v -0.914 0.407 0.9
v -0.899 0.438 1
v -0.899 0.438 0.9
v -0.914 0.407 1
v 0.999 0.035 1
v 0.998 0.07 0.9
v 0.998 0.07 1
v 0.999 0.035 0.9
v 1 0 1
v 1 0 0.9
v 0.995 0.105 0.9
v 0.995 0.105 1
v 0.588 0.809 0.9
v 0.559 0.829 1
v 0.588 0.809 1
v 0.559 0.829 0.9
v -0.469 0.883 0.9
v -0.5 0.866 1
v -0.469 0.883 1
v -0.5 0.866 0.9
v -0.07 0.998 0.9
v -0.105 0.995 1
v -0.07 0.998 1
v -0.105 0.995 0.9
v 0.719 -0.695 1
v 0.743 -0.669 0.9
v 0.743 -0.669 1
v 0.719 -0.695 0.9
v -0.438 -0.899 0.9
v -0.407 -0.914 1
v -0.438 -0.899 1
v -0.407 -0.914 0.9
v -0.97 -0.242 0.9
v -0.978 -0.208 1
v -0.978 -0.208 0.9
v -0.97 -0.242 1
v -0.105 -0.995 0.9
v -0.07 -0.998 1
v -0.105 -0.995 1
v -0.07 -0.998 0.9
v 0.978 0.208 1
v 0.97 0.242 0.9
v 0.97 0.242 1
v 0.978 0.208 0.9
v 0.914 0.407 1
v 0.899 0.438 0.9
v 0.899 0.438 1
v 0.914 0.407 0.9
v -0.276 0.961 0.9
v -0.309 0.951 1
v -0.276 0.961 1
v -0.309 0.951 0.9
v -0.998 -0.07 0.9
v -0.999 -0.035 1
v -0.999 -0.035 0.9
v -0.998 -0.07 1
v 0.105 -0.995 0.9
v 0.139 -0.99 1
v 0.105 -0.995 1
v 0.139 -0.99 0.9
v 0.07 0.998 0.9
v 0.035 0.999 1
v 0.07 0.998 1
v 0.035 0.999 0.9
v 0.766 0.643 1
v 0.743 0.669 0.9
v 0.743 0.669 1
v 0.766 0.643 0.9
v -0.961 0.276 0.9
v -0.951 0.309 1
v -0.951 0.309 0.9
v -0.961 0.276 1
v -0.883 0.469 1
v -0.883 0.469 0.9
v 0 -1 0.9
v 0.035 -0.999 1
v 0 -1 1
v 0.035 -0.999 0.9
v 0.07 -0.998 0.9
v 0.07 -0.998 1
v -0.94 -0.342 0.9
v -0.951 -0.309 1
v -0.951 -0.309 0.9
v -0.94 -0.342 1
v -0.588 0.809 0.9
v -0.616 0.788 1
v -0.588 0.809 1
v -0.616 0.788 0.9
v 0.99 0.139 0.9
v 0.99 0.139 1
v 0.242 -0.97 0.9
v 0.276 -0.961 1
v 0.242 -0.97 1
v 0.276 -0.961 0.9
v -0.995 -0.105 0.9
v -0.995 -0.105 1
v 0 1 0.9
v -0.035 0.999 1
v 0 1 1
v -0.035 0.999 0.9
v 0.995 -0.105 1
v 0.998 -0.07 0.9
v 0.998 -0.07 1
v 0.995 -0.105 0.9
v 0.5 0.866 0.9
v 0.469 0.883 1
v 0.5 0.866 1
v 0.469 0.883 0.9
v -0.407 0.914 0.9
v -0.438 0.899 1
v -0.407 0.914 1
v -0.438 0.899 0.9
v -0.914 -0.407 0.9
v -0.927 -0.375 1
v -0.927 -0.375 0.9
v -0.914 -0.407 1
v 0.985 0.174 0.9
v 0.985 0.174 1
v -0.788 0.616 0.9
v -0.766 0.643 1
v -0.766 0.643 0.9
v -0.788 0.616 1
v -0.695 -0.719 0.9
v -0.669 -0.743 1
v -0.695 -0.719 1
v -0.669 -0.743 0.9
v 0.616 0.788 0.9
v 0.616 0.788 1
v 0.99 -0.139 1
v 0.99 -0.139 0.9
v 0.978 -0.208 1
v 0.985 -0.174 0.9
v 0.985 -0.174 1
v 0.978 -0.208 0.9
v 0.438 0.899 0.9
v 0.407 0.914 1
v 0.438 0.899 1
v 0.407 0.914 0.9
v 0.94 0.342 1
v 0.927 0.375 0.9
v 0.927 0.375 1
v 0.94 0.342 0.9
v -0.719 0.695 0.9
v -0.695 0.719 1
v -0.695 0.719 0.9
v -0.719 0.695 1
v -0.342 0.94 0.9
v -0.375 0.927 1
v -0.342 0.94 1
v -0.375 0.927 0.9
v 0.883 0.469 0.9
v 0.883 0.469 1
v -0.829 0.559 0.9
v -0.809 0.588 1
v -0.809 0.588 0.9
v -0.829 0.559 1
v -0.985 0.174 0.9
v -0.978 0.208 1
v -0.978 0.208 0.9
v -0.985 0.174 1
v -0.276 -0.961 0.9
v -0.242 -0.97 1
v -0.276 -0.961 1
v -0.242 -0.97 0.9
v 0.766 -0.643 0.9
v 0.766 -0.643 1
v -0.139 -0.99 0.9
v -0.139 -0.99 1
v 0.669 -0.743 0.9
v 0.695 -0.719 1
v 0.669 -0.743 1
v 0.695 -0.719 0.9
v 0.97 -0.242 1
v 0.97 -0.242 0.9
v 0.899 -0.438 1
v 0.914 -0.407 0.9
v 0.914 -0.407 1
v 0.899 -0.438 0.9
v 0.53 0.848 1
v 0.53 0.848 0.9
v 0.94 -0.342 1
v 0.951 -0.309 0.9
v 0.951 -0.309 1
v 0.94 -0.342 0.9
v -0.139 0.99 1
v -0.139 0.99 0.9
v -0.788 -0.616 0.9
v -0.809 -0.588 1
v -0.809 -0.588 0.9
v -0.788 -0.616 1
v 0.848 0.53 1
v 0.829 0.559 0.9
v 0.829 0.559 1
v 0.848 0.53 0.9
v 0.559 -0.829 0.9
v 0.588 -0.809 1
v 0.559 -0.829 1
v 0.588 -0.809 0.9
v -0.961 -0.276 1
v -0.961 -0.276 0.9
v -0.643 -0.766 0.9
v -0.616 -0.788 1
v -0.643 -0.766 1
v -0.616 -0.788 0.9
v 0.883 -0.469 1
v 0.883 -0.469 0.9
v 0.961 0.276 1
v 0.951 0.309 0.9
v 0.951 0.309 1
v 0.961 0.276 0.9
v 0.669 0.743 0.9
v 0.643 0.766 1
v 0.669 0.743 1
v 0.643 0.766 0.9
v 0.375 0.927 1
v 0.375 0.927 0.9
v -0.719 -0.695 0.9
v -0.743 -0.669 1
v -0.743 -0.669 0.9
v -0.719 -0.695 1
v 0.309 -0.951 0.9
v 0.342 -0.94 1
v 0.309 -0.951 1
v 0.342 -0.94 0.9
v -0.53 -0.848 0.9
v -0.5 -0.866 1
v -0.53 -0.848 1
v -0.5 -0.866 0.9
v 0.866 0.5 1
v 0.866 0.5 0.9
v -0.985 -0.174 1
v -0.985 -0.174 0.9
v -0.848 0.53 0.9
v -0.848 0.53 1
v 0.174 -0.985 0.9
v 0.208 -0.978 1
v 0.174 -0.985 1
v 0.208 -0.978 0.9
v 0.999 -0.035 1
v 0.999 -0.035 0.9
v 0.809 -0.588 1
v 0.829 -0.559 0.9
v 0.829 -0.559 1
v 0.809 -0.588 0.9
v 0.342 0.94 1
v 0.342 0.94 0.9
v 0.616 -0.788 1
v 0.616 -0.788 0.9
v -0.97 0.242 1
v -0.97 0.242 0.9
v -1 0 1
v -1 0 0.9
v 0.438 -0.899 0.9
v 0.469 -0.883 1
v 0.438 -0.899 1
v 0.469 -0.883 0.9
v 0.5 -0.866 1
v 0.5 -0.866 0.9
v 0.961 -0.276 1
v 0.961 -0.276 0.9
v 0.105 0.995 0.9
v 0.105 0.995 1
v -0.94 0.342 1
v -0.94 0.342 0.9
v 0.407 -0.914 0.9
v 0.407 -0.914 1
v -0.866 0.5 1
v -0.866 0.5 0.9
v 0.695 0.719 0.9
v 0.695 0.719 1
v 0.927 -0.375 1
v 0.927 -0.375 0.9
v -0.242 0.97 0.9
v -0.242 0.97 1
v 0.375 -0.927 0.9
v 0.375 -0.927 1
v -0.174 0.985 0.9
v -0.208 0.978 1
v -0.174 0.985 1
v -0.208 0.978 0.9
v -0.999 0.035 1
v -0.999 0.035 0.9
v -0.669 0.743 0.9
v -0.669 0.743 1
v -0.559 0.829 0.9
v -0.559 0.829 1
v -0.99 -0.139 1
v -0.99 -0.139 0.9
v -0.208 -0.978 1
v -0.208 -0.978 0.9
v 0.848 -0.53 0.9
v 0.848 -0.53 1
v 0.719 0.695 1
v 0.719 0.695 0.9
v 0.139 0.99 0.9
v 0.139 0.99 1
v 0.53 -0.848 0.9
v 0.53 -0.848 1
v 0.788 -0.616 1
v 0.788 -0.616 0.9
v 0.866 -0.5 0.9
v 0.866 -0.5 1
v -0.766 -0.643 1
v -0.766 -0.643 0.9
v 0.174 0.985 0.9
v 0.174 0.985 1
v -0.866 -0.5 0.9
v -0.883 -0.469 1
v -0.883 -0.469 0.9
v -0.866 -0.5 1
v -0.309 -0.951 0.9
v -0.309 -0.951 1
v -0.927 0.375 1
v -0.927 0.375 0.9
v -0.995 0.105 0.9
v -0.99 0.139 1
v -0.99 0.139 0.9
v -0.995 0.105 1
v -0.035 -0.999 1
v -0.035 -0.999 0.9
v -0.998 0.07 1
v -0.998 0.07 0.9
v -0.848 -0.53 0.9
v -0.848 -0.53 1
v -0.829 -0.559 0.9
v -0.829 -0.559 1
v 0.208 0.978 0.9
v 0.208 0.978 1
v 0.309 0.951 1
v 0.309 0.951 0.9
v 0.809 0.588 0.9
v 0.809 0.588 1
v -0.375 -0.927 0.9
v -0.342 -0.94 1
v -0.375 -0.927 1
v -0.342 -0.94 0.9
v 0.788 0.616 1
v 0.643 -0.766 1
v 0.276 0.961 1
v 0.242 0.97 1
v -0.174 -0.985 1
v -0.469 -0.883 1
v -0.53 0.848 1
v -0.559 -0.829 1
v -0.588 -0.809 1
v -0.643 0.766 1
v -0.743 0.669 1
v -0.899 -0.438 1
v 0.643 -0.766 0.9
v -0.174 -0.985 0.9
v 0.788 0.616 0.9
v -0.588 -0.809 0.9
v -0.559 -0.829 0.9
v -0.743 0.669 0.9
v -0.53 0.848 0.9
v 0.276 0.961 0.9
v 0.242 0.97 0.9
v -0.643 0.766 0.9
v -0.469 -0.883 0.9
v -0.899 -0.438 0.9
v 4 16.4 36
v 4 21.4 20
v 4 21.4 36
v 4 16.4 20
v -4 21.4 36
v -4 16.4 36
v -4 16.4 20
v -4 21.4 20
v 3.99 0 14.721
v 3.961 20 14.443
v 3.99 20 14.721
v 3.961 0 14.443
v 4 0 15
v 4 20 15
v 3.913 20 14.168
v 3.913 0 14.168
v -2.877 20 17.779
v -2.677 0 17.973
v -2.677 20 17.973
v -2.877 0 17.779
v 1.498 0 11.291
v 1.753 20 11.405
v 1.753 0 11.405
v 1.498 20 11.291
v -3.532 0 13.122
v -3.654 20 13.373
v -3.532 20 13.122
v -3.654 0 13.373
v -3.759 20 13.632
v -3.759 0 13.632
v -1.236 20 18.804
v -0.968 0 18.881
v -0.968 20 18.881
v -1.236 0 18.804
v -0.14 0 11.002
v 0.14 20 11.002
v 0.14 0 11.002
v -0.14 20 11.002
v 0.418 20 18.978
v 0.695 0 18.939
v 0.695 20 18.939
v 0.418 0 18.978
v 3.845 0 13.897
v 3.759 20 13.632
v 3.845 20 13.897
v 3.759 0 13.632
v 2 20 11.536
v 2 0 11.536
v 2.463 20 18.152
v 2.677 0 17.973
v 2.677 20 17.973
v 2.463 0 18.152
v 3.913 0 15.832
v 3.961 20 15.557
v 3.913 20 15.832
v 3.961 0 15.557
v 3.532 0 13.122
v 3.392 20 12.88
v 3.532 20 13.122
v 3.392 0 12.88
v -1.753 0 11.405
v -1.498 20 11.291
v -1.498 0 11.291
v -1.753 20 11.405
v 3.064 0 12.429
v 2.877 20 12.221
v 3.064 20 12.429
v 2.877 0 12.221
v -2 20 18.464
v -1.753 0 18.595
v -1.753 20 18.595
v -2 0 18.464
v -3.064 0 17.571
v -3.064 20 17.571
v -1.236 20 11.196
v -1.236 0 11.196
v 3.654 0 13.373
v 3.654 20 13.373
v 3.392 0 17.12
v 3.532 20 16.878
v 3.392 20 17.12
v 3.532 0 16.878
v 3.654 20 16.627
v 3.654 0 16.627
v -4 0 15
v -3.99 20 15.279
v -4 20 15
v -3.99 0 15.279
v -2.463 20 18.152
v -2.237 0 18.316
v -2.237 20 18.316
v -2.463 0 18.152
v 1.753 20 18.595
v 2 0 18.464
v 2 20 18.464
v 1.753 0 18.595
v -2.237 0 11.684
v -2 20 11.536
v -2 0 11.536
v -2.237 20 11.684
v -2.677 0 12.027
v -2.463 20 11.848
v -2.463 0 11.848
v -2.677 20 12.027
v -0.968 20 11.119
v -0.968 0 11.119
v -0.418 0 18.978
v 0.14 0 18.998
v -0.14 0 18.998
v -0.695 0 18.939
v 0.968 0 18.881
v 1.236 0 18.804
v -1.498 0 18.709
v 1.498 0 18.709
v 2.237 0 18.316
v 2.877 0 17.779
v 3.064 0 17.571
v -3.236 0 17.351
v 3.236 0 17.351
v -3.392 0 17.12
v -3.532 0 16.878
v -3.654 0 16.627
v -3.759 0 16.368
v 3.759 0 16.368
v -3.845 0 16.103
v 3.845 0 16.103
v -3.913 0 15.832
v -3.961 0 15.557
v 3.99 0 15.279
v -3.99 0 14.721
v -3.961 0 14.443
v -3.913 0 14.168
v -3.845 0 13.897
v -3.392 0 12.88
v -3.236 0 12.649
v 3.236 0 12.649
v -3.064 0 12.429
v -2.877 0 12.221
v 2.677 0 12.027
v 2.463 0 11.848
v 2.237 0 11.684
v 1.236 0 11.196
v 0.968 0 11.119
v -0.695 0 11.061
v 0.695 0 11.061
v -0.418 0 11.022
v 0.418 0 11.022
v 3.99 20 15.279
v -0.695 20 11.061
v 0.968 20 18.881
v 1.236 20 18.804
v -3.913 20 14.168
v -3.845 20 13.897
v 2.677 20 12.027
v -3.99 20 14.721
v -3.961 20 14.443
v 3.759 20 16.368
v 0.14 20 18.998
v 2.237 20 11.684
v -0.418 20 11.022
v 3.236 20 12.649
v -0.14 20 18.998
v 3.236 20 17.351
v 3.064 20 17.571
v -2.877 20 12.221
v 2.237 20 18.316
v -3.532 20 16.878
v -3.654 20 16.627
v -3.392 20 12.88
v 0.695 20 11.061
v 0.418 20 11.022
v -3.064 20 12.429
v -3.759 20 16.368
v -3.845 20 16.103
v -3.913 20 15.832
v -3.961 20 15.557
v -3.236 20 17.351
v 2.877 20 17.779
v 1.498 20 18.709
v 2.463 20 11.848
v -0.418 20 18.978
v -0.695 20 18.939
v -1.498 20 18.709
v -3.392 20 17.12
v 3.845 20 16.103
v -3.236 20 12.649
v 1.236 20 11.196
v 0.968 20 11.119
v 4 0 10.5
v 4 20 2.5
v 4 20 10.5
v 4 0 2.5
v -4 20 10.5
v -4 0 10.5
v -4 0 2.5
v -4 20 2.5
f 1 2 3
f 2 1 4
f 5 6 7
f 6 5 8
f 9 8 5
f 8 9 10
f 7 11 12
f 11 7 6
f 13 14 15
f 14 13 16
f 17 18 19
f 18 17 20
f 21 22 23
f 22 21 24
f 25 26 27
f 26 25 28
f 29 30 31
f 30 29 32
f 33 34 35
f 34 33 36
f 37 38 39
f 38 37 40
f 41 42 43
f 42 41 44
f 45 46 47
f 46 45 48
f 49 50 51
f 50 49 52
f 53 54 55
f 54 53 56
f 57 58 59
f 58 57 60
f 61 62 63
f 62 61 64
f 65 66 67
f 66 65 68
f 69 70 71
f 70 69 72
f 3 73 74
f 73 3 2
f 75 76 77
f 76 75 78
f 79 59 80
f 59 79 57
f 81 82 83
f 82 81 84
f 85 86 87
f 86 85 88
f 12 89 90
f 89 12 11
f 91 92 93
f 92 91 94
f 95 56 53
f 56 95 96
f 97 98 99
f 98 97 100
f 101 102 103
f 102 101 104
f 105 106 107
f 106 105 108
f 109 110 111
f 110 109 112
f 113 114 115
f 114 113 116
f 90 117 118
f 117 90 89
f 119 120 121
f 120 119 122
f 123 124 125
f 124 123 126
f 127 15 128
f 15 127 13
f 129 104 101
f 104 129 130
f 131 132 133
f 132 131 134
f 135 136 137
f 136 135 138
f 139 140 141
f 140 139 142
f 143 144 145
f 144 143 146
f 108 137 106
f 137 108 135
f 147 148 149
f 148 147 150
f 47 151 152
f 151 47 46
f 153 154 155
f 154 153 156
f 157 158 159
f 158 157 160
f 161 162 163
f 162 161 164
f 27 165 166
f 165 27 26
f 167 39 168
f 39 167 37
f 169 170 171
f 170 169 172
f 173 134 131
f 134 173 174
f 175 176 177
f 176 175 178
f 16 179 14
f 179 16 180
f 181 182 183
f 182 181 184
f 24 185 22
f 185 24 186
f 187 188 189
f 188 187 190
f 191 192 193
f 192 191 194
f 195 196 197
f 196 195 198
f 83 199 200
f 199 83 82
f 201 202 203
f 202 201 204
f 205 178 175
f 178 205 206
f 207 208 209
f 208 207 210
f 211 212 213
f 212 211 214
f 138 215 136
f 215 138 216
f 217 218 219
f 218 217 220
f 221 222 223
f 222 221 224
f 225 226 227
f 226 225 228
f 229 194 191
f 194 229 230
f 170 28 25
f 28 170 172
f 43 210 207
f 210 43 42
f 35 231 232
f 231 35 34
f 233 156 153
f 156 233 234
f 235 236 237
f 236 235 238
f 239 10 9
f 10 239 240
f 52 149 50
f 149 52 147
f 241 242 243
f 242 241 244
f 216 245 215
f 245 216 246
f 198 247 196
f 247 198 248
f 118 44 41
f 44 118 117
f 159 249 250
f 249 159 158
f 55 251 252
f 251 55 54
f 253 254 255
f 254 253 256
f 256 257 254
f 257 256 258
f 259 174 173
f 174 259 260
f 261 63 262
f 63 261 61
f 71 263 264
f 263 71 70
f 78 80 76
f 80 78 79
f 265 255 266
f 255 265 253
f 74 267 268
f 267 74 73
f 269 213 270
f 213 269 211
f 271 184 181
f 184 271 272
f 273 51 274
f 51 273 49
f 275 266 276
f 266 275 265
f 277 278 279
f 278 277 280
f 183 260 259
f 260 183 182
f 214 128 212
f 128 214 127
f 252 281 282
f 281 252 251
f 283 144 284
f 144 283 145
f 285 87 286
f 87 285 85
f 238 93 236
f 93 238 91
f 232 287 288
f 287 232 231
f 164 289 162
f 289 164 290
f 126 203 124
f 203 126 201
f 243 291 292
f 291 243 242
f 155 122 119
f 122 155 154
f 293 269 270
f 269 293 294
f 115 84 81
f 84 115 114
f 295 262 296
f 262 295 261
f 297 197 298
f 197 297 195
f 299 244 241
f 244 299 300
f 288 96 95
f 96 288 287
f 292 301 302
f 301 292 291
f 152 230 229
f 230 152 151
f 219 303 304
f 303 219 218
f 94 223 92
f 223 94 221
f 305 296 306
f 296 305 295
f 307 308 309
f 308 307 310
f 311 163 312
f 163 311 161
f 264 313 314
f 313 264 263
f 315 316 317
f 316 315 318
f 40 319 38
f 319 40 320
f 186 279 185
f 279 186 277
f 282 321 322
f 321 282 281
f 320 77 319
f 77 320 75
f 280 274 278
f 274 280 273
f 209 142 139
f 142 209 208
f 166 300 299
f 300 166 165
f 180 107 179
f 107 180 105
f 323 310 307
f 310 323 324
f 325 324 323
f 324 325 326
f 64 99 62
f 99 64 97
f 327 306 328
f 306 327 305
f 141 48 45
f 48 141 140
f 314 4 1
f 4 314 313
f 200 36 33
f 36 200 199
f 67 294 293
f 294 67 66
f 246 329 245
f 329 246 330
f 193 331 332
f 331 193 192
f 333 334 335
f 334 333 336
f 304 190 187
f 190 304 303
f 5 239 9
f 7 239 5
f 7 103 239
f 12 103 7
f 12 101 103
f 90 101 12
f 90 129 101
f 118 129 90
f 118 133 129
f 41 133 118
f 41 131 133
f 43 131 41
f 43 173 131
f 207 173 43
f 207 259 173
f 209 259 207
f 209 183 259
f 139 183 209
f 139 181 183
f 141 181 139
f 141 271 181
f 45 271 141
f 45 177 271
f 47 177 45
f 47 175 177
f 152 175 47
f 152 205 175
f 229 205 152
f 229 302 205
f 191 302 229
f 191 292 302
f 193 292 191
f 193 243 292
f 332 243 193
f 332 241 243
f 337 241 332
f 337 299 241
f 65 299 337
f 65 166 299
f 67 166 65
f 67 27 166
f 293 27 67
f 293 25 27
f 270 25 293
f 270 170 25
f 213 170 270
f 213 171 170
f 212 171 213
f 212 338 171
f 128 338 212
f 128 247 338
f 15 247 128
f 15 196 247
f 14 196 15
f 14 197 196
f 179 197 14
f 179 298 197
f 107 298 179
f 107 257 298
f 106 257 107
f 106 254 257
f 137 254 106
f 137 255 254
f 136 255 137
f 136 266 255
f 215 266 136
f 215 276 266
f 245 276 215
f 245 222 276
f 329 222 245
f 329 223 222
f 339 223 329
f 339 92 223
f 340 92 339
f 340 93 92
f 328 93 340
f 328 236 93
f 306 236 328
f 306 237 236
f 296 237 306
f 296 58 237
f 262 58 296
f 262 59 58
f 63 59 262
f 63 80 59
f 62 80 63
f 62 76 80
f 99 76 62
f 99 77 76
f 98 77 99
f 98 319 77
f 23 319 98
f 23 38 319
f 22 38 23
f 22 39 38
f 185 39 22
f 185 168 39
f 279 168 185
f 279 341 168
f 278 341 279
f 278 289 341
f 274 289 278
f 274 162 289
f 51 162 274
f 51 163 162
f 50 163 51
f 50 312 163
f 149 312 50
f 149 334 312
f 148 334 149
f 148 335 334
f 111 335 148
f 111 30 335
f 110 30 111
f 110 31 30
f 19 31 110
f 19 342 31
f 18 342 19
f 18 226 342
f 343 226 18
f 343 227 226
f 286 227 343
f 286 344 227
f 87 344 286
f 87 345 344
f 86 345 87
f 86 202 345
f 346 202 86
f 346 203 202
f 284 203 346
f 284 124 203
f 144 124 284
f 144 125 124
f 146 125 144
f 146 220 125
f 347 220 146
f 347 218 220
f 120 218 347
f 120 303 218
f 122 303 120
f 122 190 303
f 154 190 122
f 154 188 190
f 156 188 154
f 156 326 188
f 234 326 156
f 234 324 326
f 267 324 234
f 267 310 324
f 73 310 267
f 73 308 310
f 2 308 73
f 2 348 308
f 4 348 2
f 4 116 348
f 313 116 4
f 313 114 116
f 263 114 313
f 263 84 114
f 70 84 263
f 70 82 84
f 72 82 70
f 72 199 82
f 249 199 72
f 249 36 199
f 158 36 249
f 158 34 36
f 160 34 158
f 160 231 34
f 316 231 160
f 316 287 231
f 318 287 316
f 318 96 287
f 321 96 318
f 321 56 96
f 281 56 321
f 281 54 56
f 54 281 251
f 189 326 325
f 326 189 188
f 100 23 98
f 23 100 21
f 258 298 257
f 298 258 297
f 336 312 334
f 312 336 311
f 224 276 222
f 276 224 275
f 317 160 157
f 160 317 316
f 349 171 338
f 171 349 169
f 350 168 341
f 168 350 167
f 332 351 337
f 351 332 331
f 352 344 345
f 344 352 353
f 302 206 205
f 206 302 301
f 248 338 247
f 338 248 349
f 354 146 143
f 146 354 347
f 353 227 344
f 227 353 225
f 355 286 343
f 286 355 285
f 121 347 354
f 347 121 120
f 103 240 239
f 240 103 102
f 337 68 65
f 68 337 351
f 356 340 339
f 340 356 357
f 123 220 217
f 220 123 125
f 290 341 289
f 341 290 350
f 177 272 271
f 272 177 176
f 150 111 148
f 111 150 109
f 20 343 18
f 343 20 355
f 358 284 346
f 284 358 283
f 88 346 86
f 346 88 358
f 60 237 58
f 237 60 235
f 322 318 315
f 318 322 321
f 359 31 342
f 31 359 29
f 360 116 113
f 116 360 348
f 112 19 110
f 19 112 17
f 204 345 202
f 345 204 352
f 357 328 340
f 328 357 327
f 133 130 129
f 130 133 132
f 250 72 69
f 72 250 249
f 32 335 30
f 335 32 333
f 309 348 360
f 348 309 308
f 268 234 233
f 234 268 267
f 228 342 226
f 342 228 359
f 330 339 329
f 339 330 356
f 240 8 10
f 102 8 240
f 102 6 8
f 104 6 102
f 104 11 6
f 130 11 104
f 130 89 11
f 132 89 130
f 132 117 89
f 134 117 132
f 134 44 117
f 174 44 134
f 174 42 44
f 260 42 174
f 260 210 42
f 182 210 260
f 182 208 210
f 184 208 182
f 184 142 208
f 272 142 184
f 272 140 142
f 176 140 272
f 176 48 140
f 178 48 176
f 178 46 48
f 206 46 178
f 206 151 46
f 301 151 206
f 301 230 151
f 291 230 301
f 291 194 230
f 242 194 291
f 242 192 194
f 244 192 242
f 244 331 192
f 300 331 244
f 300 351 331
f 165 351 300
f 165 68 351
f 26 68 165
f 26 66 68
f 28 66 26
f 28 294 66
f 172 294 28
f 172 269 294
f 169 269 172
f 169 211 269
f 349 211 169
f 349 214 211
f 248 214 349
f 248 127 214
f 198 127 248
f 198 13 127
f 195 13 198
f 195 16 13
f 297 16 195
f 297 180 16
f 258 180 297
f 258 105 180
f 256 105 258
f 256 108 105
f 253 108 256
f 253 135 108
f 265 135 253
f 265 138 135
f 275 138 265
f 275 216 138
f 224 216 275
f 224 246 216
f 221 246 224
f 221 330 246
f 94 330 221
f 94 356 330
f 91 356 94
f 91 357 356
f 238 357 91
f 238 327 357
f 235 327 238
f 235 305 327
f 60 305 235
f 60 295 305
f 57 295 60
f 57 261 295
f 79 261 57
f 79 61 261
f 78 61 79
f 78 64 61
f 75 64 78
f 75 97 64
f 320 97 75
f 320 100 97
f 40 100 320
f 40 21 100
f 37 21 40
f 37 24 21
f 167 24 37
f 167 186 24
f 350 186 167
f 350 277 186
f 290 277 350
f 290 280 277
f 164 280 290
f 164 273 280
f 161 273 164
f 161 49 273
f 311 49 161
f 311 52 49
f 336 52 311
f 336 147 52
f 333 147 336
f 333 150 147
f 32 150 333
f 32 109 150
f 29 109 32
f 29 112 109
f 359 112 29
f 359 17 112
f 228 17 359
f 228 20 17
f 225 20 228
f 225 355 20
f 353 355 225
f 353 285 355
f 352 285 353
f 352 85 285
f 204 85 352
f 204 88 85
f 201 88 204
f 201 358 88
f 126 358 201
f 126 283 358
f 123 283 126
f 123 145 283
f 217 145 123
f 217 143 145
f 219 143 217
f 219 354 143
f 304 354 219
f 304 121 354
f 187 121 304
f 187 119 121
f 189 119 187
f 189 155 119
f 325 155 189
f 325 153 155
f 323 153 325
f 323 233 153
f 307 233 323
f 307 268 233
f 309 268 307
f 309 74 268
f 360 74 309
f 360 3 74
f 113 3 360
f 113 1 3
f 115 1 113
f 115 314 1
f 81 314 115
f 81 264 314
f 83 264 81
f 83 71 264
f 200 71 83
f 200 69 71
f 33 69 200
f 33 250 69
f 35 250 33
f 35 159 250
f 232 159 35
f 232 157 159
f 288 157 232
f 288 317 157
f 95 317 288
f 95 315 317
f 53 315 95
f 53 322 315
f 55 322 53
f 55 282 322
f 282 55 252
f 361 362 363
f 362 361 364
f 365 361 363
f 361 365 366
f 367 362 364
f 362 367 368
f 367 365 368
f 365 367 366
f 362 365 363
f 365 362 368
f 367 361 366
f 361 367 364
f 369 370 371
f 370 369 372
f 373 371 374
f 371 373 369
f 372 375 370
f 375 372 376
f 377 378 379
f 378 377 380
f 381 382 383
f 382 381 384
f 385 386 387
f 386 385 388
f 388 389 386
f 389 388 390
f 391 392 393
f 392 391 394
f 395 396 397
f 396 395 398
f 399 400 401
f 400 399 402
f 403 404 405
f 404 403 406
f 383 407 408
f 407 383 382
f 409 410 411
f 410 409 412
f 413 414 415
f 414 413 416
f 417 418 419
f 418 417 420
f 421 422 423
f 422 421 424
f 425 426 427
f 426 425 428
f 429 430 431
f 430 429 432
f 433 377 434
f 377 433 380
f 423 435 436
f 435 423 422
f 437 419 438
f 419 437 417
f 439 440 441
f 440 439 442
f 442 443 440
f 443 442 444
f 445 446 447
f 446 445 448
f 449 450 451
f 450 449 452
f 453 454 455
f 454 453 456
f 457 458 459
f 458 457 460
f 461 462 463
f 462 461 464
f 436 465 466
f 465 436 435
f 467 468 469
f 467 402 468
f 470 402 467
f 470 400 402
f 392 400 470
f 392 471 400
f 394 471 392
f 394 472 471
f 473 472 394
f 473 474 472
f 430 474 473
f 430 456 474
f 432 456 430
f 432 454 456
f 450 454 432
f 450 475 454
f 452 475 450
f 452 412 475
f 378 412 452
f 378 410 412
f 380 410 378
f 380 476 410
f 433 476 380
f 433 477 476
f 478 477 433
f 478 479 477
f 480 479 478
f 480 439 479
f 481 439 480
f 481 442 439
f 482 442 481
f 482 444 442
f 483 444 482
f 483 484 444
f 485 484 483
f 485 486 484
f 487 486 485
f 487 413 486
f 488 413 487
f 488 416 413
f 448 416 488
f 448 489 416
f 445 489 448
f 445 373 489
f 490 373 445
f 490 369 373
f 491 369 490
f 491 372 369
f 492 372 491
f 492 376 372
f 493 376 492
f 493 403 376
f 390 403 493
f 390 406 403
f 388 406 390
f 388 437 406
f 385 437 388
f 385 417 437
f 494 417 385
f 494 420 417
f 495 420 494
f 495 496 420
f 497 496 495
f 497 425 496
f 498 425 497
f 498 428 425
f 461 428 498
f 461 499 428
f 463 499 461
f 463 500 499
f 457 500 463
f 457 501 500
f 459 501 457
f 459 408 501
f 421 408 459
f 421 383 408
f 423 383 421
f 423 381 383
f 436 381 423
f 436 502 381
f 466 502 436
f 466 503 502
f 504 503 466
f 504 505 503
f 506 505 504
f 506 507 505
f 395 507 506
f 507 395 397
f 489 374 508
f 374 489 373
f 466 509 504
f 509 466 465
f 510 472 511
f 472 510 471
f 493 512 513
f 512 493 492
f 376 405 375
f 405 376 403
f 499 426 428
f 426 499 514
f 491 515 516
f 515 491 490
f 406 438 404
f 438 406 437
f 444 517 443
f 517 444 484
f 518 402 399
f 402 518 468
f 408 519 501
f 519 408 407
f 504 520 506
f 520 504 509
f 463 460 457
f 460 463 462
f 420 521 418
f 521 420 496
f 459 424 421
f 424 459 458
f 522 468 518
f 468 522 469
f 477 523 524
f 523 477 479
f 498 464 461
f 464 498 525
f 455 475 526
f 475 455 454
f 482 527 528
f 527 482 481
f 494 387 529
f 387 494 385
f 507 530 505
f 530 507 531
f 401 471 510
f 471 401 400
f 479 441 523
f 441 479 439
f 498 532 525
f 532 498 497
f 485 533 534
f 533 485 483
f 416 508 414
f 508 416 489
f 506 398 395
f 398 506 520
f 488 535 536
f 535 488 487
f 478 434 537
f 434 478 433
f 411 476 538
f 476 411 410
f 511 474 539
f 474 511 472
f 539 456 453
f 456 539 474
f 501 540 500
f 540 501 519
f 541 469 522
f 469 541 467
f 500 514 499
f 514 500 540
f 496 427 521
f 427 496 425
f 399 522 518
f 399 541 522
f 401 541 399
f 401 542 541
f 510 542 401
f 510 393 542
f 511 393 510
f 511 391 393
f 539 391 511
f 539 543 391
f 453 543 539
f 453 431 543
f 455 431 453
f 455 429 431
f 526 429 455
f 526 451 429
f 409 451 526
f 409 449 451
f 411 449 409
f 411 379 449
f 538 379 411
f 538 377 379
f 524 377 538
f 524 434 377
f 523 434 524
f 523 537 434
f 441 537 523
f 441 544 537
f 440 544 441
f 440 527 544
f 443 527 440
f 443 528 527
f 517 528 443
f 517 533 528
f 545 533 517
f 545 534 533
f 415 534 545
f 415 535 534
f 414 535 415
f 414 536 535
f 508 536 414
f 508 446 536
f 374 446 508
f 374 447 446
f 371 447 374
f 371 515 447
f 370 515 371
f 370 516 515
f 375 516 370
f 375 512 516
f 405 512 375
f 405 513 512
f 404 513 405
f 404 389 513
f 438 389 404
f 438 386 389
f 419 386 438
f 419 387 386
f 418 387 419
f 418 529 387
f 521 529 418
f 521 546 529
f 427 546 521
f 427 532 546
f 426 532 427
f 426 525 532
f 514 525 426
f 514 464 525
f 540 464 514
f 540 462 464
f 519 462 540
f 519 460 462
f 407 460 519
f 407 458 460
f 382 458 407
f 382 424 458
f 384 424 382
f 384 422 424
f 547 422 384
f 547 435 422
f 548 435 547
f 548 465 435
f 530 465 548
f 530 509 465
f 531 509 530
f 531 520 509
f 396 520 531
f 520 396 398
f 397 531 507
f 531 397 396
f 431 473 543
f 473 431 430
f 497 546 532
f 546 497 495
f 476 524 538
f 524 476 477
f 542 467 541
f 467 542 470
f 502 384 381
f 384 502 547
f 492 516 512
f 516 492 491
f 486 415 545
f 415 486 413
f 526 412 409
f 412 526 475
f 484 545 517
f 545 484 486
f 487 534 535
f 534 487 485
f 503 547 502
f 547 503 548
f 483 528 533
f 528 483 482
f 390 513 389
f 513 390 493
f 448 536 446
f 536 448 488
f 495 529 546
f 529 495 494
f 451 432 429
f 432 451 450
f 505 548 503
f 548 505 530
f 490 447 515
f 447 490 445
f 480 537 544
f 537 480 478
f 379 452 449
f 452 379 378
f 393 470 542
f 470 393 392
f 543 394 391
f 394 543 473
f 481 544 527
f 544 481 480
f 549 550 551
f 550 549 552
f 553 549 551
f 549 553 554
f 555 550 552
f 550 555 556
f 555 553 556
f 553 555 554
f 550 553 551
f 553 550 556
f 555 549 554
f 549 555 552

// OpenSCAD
// file: util.scad
include <dim.scad>

module inner()
{
    translate([0, 0, M_AFT_BACK])
        cylinder(h=DZ_AFT, d=D_AFT);
    translate([0, 0, M_MID_BACK])
        cylinder(h=DZ_MID, d=D_MID);
    translate([0, 0, M_FORE_BACK])
        cylinder(h=DZ_FORE, d=D_FORE);
}
// file: ../shapes.scad
FACES   = 180;
EPSILON = 0.1;
PIN	    = 2.54;


module tube(_h, _rInner, _rOuter) {
	difference() {
		cylinder(h=_h, r=_rOuter, $fn=FACES);
		translate([0,0,-EPSILON]) {
			cylinder(h=_h + EPSILON*2, r=_rInner, $fn=FACES);
		}
	}
}

module shelf(_r0, _h, _r1) {
	rotate_extrude($fn=FACES) {
		polygon([[_r0, 0], [_r1, _h], [_r0, _h]]);
	}
}


module pinsAtTube(r, h, nX, nY, longY)
{
	OFFSET = sqrt(r * r - PIN * PIN * nX * nX / 4);

	Y = longY ? 40 : PIN * nY;

    translate([-nX * PIN / 2, OFFSET - PIN * nY, 0]) {
        cube([nX * PIN, Y, h]);
    }	
}
// file: dim.scad
D_FORE = 29.0;
DZ_FORE = 63.0;

D_MID = 31.75;
D_MID_OUTER = 36.8;
DZ_MID = 25.6;          // inner length with the fore/aft attached
DZ_MID_OUTER = 50.7;    // the length of the midsection on the outside

D_AFT = 31.75;
DZ_AFT = 76.3;

DZ_THREAD = 10.5;

M_AFT_BACK = DZ_THREAD - DZ_AFT;
M_AFT_FRONT = DZ_THREAD;
M_MID_BACK = M_AFT_FRONT;
M_MID_FRONT = M_MID_BACK + DZ_MID;
M_FORE_BACK = M_MID_FRONT;
M_FORE_FRONT = M_FORE_BACK + DZ_FORE;

M_MID_CENTER = (M_MID_BACK + M_MID_FRONT) / 2;

PLATE_DX = 10;
PLATE_DZ = 44;
PLATE_MOUNT = 16.8;
PLATE_MOUNT_WITH_THREAD = 24.8;
BOX_DX = 14;
BOX_Y = 5.0;
// main file
include <dim.scad>
use <../shapes.scad>
use <util.scad>

$fn = 90;


module midSection() {
    difference() {
        tube(h=DZ_MID_OUTER, di=D_MID, do=D_MID_OUTER);

        SPACE = 2.0;
        END = DZ_MID_OUTER / 2 + PLATE_MOUNT_WITH_THREAD / 2;
        TOOL = 3.2;
        DZSLOT = END - SPACE - TOOL;
        HT = TOOL / 2;

        hull() {
            translate([ 5, 0, SPACE + HT]) rotate([-90, 0, 0]) cylinder(h=200, d=TOOL);
            translate([-5, 0, SPACE + HT]) rotate([-90, 0, 0]) cylinder(h=200, d=TOOL);
            translate([ 5, 0, SPACE + DZSLOT]) rotate([-90, 0, 0]) cylinder(h=200, d=TOOL);
            translate([-5, 0, SPACE + DZSLOT]) rotate([-90, 0, 0]) cylinder(h=200, d=TOOL);
        }
    }
}

midSection();

color("red") {
    DX_BUBBLE = 8; // without leads
    DY_BUBBLE = 5;  // more space for leads
    DZ_BUBBLE = 16;

    translate([-DX_BUBBLE/2, D_MID_OUTER/2 - 2, 20])
        cube(size=[DX_BUBBLE, DY_BUBBLE, DZ_BUBBLE]);
}

color("green") {
    translate([0, 0, 15]) rotate([-90, 0, 0]) cylinder(h=20, d=8);
}

color("gray") {
    S = 8.0;
    translate([-S/2, 0, 2.5]) cube(size=[S, 20, S]);
}

/*
difference() {
    union() {
        // Box
        difference() {
            translate([-BOX_DX/2, 0, 0]) 
                cube(size=[BOX_DX, D_MID_OUTER/2 + BOX_Y, DZ_MID_OUTER]);
        translate([-PLATE_DX/2, 0, (DZ_MID_OUTER - PLATE_DZ)/2]) 
            cube(size=[PLATE_DX, 100, PLATE_DZ]);            
        }

        // Switch mount
        DZ_PORT_MOUNT = 12;
        translate([-BOX_DX/2, 0, (DZ_MID_OUTER - DZ_PORT_MOUNT)/2]) 
            cube(size=[BOX_DX, D_MID_OUTER/2+3, DZ_PORT_MOUNT]);

        
    }

    cylinder(h=DZ_MID_OUTER, d=D_MID_OUTER);
    translate([0, 0, DZ_MID_OUTER/2]) rotate([-90, 0, 0]) 
        cylinder(h=100, d=D_POWER_PORT);
}

color("yellow") {
    // Thread zone
    translate([-PLATE_DX/2, D_MID_OUTER/2, (DZ_MID_OUTER - PLATE_MOUNT_WITH_THREAD)/2])
        cube(size=[PLATE_DX, 1, PLATE_MOUNT_WITH_THREAD]);
}

color("red") {
    DX_BUBBLE = 10; // maybe 8 or 9
    DY_BUBBLE = 5;  // more space for leads
    DZ_BUBBLE = 16;

    translate([-DX_BUBBLE/2, D_MID_OUTER/2 + 1, 31.5])
        cube(size=[DX_BUBBLE, DY_BUBBLE, DZ_BUBBLE]);
}
*/

//inner();
